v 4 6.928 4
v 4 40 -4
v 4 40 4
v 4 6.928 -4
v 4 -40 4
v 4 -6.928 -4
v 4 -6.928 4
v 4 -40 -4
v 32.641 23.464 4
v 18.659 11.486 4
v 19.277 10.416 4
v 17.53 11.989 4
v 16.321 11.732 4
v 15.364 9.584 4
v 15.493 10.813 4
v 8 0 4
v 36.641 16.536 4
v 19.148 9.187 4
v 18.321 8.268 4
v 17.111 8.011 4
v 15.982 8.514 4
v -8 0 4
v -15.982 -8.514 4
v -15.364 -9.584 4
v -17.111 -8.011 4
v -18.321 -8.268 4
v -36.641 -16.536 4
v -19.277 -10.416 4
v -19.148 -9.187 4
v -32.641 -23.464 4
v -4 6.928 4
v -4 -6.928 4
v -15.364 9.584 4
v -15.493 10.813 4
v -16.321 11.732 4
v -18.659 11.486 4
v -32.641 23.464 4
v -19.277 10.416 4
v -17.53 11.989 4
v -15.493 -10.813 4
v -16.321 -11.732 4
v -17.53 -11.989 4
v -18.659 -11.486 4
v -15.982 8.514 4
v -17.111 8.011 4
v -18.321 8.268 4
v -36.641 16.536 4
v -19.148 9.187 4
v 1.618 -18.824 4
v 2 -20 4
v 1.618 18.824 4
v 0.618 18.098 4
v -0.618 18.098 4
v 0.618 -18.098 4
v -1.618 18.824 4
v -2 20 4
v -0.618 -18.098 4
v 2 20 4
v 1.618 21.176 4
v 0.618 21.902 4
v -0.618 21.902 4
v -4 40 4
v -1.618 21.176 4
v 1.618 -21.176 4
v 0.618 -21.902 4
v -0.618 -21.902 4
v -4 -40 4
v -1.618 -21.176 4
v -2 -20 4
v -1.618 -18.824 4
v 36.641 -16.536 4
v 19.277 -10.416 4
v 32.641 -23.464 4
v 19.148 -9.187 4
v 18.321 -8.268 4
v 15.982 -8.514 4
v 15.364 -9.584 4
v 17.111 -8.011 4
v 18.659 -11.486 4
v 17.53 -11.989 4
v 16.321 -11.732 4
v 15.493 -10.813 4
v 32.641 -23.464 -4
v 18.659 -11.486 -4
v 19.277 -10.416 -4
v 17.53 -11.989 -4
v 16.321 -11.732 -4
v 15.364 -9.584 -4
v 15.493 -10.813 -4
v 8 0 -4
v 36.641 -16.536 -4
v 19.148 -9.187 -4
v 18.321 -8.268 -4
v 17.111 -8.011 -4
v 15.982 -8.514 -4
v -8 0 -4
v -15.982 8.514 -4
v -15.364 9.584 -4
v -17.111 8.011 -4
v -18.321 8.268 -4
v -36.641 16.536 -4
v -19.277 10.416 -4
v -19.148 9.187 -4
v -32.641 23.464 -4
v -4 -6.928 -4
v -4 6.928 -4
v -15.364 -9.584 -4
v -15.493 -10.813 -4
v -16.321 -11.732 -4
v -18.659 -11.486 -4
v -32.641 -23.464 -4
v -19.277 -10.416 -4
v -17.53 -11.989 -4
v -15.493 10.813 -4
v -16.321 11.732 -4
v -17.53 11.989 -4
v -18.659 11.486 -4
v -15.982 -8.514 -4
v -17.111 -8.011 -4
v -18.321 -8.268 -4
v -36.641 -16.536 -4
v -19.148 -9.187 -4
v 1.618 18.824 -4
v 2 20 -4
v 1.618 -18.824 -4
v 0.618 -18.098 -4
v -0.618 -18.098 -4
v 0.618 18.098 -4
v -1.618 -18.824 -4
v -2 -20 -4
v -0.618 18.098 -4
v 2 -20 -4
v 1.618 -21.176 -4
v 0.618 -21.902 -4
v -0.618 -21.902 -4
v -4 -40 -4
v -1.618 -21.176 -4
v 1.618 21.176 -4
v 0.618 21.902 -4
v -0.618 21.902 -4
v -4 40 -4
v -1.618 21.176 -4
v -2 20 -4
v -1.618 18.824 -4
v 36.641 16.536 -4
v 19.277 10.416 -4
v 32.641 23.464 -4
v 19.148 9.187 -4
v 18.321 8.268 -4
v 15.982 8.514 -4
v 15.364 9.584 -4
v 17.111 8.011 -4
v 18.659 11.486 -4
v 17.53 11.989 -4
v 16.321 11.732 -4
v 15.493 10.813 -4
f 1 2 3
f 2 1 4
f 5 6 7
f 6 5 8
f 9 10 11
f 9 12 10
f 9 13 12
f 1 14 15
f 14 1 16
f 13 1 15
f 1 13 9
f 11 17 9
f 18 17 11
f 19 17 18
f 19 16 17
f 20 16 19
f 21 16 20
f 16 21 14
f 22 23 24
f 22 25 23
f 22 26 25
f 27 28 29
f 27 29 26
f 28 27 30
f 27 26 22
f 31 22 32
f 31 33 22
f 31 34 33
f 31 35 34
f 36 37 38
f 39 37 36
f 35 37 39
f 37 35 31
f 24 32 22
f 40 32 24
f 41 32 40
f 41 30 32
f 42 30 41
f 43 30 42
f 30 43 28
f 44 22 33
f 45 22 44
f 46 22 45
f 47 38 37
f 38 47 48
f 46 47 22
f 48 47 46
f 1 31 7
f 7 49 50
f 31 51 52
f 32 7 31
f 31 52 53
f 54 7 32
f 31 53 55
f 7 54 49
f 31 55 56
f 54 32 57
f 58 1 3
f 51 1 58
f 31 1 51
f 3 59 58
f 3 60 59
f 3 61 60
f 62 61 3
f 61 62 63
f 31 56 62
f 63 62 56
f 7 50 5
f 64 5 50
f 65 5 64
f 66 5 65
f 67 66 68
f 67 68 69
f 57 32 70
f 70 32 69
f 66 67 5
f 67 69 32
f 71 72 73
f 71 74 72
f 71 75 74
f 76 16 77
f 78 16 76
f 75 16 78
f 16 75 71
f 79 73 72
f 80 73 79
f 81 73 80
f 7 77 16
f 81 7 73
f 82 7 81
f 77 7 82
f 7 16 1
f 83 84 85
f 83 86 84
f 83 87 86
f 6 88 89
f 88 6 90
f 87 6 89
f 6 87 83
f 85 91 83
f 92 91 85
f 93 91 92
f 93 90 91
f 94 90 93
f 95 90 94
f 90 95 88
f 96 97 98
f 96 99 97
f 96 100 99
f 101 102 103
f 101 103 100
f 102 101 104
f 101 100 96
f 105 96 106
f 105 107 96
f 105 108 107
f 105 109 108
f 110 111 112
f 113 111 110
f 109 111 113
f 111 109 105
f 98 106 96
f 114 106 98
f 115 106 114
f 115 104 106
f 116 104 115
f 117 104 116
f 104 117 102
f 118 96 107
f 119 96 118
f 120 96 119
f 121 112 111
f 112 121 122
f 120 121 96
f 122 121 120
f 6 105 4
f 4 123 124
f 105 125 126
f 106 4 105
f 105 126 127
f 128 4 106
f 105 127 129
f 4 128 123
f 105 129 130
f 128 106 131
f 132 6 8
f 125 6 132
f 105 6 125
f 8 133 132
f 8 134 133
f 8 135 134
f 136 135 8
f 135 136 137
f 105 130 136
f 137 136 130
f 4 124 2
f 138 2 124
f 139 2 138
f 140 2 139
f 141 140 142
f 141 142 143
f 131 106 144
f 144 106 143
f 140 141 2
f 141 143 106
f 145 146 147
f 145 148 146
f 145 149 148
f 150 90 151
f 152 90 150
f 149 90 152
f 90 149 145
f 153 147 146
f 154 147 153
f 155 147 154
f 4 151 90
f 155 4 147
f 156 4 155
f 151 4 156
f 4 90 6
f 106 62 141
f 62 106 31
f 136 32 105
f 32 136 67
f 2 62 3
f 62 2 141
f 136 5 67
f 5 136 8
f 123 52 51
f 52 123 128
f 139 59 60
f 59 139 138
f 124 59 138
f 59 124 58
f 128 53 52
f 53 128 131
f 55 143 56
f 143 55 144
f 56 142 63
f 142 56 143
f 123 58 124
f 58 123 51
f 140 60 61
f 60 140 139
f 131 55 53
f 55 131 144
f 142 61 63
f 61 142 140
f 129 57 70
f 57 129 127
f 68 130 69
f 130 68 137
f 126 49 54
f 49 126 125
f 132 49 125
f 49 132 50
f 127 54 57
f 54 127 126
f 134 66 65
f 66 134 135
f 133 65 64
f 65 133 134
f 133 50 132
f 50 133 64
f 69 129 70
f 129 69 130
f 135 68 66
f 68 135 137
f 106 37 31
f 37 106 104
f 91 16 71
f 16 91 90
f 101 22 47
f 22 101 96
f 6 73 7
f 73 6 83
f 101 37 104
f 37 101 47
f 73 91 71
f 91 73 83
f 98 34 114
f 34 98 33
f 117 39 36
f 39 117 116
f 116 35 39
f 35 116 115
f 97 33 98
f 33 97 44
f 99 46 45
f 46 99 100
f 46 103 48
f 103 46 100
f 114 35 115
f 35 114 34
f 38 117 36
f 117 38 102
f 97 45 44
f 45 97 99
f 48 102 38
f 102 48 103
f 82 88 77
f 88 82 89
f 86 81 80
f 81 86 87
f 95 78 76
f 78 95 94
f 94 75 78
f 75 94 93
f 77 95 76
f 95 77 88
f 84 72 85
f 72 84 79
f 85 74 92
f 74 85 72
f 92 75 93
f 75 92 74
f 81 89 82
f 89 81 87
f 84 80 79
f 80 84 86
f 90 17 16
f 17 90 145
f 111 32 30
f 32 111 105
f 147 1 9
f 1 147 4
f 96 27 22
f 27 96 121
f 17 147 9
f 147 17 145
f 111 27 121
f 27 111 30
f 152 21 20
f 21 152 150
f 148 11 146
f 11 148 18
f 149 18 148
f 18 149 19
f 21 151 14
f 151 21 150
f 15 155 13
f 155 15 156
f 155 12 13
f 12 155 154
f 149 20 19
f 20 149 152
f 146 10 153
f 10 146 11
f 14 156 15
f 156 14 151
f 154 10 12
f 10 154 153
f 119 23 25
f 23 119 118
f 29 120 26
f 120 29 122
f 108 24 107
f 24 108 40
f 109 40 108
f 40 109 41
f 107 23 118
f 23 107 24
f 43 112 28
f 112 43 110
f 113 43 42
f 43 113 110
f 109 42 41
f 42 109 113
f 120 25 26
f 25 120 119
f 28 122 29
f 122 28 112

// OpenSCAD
alu_l = 8;
alu_h = 8;
long = 40;

fix_l = 20;
fix_d = 4;
$fn=10;

module tige(){
    difference(){
        cube([alu_l,long*2,alu_h], center=true);
        translate([0,fix_l,0]) cylinder(h=alu_h+2,d=fix_d,center=true);
        translate([0,-fix_l,0]) cylinder(h=alu_h+2,d=fix_d,center=true);
    }
}

tige();
rotate([0,0,60])tige();
rotate([0,0,-60])tige();
